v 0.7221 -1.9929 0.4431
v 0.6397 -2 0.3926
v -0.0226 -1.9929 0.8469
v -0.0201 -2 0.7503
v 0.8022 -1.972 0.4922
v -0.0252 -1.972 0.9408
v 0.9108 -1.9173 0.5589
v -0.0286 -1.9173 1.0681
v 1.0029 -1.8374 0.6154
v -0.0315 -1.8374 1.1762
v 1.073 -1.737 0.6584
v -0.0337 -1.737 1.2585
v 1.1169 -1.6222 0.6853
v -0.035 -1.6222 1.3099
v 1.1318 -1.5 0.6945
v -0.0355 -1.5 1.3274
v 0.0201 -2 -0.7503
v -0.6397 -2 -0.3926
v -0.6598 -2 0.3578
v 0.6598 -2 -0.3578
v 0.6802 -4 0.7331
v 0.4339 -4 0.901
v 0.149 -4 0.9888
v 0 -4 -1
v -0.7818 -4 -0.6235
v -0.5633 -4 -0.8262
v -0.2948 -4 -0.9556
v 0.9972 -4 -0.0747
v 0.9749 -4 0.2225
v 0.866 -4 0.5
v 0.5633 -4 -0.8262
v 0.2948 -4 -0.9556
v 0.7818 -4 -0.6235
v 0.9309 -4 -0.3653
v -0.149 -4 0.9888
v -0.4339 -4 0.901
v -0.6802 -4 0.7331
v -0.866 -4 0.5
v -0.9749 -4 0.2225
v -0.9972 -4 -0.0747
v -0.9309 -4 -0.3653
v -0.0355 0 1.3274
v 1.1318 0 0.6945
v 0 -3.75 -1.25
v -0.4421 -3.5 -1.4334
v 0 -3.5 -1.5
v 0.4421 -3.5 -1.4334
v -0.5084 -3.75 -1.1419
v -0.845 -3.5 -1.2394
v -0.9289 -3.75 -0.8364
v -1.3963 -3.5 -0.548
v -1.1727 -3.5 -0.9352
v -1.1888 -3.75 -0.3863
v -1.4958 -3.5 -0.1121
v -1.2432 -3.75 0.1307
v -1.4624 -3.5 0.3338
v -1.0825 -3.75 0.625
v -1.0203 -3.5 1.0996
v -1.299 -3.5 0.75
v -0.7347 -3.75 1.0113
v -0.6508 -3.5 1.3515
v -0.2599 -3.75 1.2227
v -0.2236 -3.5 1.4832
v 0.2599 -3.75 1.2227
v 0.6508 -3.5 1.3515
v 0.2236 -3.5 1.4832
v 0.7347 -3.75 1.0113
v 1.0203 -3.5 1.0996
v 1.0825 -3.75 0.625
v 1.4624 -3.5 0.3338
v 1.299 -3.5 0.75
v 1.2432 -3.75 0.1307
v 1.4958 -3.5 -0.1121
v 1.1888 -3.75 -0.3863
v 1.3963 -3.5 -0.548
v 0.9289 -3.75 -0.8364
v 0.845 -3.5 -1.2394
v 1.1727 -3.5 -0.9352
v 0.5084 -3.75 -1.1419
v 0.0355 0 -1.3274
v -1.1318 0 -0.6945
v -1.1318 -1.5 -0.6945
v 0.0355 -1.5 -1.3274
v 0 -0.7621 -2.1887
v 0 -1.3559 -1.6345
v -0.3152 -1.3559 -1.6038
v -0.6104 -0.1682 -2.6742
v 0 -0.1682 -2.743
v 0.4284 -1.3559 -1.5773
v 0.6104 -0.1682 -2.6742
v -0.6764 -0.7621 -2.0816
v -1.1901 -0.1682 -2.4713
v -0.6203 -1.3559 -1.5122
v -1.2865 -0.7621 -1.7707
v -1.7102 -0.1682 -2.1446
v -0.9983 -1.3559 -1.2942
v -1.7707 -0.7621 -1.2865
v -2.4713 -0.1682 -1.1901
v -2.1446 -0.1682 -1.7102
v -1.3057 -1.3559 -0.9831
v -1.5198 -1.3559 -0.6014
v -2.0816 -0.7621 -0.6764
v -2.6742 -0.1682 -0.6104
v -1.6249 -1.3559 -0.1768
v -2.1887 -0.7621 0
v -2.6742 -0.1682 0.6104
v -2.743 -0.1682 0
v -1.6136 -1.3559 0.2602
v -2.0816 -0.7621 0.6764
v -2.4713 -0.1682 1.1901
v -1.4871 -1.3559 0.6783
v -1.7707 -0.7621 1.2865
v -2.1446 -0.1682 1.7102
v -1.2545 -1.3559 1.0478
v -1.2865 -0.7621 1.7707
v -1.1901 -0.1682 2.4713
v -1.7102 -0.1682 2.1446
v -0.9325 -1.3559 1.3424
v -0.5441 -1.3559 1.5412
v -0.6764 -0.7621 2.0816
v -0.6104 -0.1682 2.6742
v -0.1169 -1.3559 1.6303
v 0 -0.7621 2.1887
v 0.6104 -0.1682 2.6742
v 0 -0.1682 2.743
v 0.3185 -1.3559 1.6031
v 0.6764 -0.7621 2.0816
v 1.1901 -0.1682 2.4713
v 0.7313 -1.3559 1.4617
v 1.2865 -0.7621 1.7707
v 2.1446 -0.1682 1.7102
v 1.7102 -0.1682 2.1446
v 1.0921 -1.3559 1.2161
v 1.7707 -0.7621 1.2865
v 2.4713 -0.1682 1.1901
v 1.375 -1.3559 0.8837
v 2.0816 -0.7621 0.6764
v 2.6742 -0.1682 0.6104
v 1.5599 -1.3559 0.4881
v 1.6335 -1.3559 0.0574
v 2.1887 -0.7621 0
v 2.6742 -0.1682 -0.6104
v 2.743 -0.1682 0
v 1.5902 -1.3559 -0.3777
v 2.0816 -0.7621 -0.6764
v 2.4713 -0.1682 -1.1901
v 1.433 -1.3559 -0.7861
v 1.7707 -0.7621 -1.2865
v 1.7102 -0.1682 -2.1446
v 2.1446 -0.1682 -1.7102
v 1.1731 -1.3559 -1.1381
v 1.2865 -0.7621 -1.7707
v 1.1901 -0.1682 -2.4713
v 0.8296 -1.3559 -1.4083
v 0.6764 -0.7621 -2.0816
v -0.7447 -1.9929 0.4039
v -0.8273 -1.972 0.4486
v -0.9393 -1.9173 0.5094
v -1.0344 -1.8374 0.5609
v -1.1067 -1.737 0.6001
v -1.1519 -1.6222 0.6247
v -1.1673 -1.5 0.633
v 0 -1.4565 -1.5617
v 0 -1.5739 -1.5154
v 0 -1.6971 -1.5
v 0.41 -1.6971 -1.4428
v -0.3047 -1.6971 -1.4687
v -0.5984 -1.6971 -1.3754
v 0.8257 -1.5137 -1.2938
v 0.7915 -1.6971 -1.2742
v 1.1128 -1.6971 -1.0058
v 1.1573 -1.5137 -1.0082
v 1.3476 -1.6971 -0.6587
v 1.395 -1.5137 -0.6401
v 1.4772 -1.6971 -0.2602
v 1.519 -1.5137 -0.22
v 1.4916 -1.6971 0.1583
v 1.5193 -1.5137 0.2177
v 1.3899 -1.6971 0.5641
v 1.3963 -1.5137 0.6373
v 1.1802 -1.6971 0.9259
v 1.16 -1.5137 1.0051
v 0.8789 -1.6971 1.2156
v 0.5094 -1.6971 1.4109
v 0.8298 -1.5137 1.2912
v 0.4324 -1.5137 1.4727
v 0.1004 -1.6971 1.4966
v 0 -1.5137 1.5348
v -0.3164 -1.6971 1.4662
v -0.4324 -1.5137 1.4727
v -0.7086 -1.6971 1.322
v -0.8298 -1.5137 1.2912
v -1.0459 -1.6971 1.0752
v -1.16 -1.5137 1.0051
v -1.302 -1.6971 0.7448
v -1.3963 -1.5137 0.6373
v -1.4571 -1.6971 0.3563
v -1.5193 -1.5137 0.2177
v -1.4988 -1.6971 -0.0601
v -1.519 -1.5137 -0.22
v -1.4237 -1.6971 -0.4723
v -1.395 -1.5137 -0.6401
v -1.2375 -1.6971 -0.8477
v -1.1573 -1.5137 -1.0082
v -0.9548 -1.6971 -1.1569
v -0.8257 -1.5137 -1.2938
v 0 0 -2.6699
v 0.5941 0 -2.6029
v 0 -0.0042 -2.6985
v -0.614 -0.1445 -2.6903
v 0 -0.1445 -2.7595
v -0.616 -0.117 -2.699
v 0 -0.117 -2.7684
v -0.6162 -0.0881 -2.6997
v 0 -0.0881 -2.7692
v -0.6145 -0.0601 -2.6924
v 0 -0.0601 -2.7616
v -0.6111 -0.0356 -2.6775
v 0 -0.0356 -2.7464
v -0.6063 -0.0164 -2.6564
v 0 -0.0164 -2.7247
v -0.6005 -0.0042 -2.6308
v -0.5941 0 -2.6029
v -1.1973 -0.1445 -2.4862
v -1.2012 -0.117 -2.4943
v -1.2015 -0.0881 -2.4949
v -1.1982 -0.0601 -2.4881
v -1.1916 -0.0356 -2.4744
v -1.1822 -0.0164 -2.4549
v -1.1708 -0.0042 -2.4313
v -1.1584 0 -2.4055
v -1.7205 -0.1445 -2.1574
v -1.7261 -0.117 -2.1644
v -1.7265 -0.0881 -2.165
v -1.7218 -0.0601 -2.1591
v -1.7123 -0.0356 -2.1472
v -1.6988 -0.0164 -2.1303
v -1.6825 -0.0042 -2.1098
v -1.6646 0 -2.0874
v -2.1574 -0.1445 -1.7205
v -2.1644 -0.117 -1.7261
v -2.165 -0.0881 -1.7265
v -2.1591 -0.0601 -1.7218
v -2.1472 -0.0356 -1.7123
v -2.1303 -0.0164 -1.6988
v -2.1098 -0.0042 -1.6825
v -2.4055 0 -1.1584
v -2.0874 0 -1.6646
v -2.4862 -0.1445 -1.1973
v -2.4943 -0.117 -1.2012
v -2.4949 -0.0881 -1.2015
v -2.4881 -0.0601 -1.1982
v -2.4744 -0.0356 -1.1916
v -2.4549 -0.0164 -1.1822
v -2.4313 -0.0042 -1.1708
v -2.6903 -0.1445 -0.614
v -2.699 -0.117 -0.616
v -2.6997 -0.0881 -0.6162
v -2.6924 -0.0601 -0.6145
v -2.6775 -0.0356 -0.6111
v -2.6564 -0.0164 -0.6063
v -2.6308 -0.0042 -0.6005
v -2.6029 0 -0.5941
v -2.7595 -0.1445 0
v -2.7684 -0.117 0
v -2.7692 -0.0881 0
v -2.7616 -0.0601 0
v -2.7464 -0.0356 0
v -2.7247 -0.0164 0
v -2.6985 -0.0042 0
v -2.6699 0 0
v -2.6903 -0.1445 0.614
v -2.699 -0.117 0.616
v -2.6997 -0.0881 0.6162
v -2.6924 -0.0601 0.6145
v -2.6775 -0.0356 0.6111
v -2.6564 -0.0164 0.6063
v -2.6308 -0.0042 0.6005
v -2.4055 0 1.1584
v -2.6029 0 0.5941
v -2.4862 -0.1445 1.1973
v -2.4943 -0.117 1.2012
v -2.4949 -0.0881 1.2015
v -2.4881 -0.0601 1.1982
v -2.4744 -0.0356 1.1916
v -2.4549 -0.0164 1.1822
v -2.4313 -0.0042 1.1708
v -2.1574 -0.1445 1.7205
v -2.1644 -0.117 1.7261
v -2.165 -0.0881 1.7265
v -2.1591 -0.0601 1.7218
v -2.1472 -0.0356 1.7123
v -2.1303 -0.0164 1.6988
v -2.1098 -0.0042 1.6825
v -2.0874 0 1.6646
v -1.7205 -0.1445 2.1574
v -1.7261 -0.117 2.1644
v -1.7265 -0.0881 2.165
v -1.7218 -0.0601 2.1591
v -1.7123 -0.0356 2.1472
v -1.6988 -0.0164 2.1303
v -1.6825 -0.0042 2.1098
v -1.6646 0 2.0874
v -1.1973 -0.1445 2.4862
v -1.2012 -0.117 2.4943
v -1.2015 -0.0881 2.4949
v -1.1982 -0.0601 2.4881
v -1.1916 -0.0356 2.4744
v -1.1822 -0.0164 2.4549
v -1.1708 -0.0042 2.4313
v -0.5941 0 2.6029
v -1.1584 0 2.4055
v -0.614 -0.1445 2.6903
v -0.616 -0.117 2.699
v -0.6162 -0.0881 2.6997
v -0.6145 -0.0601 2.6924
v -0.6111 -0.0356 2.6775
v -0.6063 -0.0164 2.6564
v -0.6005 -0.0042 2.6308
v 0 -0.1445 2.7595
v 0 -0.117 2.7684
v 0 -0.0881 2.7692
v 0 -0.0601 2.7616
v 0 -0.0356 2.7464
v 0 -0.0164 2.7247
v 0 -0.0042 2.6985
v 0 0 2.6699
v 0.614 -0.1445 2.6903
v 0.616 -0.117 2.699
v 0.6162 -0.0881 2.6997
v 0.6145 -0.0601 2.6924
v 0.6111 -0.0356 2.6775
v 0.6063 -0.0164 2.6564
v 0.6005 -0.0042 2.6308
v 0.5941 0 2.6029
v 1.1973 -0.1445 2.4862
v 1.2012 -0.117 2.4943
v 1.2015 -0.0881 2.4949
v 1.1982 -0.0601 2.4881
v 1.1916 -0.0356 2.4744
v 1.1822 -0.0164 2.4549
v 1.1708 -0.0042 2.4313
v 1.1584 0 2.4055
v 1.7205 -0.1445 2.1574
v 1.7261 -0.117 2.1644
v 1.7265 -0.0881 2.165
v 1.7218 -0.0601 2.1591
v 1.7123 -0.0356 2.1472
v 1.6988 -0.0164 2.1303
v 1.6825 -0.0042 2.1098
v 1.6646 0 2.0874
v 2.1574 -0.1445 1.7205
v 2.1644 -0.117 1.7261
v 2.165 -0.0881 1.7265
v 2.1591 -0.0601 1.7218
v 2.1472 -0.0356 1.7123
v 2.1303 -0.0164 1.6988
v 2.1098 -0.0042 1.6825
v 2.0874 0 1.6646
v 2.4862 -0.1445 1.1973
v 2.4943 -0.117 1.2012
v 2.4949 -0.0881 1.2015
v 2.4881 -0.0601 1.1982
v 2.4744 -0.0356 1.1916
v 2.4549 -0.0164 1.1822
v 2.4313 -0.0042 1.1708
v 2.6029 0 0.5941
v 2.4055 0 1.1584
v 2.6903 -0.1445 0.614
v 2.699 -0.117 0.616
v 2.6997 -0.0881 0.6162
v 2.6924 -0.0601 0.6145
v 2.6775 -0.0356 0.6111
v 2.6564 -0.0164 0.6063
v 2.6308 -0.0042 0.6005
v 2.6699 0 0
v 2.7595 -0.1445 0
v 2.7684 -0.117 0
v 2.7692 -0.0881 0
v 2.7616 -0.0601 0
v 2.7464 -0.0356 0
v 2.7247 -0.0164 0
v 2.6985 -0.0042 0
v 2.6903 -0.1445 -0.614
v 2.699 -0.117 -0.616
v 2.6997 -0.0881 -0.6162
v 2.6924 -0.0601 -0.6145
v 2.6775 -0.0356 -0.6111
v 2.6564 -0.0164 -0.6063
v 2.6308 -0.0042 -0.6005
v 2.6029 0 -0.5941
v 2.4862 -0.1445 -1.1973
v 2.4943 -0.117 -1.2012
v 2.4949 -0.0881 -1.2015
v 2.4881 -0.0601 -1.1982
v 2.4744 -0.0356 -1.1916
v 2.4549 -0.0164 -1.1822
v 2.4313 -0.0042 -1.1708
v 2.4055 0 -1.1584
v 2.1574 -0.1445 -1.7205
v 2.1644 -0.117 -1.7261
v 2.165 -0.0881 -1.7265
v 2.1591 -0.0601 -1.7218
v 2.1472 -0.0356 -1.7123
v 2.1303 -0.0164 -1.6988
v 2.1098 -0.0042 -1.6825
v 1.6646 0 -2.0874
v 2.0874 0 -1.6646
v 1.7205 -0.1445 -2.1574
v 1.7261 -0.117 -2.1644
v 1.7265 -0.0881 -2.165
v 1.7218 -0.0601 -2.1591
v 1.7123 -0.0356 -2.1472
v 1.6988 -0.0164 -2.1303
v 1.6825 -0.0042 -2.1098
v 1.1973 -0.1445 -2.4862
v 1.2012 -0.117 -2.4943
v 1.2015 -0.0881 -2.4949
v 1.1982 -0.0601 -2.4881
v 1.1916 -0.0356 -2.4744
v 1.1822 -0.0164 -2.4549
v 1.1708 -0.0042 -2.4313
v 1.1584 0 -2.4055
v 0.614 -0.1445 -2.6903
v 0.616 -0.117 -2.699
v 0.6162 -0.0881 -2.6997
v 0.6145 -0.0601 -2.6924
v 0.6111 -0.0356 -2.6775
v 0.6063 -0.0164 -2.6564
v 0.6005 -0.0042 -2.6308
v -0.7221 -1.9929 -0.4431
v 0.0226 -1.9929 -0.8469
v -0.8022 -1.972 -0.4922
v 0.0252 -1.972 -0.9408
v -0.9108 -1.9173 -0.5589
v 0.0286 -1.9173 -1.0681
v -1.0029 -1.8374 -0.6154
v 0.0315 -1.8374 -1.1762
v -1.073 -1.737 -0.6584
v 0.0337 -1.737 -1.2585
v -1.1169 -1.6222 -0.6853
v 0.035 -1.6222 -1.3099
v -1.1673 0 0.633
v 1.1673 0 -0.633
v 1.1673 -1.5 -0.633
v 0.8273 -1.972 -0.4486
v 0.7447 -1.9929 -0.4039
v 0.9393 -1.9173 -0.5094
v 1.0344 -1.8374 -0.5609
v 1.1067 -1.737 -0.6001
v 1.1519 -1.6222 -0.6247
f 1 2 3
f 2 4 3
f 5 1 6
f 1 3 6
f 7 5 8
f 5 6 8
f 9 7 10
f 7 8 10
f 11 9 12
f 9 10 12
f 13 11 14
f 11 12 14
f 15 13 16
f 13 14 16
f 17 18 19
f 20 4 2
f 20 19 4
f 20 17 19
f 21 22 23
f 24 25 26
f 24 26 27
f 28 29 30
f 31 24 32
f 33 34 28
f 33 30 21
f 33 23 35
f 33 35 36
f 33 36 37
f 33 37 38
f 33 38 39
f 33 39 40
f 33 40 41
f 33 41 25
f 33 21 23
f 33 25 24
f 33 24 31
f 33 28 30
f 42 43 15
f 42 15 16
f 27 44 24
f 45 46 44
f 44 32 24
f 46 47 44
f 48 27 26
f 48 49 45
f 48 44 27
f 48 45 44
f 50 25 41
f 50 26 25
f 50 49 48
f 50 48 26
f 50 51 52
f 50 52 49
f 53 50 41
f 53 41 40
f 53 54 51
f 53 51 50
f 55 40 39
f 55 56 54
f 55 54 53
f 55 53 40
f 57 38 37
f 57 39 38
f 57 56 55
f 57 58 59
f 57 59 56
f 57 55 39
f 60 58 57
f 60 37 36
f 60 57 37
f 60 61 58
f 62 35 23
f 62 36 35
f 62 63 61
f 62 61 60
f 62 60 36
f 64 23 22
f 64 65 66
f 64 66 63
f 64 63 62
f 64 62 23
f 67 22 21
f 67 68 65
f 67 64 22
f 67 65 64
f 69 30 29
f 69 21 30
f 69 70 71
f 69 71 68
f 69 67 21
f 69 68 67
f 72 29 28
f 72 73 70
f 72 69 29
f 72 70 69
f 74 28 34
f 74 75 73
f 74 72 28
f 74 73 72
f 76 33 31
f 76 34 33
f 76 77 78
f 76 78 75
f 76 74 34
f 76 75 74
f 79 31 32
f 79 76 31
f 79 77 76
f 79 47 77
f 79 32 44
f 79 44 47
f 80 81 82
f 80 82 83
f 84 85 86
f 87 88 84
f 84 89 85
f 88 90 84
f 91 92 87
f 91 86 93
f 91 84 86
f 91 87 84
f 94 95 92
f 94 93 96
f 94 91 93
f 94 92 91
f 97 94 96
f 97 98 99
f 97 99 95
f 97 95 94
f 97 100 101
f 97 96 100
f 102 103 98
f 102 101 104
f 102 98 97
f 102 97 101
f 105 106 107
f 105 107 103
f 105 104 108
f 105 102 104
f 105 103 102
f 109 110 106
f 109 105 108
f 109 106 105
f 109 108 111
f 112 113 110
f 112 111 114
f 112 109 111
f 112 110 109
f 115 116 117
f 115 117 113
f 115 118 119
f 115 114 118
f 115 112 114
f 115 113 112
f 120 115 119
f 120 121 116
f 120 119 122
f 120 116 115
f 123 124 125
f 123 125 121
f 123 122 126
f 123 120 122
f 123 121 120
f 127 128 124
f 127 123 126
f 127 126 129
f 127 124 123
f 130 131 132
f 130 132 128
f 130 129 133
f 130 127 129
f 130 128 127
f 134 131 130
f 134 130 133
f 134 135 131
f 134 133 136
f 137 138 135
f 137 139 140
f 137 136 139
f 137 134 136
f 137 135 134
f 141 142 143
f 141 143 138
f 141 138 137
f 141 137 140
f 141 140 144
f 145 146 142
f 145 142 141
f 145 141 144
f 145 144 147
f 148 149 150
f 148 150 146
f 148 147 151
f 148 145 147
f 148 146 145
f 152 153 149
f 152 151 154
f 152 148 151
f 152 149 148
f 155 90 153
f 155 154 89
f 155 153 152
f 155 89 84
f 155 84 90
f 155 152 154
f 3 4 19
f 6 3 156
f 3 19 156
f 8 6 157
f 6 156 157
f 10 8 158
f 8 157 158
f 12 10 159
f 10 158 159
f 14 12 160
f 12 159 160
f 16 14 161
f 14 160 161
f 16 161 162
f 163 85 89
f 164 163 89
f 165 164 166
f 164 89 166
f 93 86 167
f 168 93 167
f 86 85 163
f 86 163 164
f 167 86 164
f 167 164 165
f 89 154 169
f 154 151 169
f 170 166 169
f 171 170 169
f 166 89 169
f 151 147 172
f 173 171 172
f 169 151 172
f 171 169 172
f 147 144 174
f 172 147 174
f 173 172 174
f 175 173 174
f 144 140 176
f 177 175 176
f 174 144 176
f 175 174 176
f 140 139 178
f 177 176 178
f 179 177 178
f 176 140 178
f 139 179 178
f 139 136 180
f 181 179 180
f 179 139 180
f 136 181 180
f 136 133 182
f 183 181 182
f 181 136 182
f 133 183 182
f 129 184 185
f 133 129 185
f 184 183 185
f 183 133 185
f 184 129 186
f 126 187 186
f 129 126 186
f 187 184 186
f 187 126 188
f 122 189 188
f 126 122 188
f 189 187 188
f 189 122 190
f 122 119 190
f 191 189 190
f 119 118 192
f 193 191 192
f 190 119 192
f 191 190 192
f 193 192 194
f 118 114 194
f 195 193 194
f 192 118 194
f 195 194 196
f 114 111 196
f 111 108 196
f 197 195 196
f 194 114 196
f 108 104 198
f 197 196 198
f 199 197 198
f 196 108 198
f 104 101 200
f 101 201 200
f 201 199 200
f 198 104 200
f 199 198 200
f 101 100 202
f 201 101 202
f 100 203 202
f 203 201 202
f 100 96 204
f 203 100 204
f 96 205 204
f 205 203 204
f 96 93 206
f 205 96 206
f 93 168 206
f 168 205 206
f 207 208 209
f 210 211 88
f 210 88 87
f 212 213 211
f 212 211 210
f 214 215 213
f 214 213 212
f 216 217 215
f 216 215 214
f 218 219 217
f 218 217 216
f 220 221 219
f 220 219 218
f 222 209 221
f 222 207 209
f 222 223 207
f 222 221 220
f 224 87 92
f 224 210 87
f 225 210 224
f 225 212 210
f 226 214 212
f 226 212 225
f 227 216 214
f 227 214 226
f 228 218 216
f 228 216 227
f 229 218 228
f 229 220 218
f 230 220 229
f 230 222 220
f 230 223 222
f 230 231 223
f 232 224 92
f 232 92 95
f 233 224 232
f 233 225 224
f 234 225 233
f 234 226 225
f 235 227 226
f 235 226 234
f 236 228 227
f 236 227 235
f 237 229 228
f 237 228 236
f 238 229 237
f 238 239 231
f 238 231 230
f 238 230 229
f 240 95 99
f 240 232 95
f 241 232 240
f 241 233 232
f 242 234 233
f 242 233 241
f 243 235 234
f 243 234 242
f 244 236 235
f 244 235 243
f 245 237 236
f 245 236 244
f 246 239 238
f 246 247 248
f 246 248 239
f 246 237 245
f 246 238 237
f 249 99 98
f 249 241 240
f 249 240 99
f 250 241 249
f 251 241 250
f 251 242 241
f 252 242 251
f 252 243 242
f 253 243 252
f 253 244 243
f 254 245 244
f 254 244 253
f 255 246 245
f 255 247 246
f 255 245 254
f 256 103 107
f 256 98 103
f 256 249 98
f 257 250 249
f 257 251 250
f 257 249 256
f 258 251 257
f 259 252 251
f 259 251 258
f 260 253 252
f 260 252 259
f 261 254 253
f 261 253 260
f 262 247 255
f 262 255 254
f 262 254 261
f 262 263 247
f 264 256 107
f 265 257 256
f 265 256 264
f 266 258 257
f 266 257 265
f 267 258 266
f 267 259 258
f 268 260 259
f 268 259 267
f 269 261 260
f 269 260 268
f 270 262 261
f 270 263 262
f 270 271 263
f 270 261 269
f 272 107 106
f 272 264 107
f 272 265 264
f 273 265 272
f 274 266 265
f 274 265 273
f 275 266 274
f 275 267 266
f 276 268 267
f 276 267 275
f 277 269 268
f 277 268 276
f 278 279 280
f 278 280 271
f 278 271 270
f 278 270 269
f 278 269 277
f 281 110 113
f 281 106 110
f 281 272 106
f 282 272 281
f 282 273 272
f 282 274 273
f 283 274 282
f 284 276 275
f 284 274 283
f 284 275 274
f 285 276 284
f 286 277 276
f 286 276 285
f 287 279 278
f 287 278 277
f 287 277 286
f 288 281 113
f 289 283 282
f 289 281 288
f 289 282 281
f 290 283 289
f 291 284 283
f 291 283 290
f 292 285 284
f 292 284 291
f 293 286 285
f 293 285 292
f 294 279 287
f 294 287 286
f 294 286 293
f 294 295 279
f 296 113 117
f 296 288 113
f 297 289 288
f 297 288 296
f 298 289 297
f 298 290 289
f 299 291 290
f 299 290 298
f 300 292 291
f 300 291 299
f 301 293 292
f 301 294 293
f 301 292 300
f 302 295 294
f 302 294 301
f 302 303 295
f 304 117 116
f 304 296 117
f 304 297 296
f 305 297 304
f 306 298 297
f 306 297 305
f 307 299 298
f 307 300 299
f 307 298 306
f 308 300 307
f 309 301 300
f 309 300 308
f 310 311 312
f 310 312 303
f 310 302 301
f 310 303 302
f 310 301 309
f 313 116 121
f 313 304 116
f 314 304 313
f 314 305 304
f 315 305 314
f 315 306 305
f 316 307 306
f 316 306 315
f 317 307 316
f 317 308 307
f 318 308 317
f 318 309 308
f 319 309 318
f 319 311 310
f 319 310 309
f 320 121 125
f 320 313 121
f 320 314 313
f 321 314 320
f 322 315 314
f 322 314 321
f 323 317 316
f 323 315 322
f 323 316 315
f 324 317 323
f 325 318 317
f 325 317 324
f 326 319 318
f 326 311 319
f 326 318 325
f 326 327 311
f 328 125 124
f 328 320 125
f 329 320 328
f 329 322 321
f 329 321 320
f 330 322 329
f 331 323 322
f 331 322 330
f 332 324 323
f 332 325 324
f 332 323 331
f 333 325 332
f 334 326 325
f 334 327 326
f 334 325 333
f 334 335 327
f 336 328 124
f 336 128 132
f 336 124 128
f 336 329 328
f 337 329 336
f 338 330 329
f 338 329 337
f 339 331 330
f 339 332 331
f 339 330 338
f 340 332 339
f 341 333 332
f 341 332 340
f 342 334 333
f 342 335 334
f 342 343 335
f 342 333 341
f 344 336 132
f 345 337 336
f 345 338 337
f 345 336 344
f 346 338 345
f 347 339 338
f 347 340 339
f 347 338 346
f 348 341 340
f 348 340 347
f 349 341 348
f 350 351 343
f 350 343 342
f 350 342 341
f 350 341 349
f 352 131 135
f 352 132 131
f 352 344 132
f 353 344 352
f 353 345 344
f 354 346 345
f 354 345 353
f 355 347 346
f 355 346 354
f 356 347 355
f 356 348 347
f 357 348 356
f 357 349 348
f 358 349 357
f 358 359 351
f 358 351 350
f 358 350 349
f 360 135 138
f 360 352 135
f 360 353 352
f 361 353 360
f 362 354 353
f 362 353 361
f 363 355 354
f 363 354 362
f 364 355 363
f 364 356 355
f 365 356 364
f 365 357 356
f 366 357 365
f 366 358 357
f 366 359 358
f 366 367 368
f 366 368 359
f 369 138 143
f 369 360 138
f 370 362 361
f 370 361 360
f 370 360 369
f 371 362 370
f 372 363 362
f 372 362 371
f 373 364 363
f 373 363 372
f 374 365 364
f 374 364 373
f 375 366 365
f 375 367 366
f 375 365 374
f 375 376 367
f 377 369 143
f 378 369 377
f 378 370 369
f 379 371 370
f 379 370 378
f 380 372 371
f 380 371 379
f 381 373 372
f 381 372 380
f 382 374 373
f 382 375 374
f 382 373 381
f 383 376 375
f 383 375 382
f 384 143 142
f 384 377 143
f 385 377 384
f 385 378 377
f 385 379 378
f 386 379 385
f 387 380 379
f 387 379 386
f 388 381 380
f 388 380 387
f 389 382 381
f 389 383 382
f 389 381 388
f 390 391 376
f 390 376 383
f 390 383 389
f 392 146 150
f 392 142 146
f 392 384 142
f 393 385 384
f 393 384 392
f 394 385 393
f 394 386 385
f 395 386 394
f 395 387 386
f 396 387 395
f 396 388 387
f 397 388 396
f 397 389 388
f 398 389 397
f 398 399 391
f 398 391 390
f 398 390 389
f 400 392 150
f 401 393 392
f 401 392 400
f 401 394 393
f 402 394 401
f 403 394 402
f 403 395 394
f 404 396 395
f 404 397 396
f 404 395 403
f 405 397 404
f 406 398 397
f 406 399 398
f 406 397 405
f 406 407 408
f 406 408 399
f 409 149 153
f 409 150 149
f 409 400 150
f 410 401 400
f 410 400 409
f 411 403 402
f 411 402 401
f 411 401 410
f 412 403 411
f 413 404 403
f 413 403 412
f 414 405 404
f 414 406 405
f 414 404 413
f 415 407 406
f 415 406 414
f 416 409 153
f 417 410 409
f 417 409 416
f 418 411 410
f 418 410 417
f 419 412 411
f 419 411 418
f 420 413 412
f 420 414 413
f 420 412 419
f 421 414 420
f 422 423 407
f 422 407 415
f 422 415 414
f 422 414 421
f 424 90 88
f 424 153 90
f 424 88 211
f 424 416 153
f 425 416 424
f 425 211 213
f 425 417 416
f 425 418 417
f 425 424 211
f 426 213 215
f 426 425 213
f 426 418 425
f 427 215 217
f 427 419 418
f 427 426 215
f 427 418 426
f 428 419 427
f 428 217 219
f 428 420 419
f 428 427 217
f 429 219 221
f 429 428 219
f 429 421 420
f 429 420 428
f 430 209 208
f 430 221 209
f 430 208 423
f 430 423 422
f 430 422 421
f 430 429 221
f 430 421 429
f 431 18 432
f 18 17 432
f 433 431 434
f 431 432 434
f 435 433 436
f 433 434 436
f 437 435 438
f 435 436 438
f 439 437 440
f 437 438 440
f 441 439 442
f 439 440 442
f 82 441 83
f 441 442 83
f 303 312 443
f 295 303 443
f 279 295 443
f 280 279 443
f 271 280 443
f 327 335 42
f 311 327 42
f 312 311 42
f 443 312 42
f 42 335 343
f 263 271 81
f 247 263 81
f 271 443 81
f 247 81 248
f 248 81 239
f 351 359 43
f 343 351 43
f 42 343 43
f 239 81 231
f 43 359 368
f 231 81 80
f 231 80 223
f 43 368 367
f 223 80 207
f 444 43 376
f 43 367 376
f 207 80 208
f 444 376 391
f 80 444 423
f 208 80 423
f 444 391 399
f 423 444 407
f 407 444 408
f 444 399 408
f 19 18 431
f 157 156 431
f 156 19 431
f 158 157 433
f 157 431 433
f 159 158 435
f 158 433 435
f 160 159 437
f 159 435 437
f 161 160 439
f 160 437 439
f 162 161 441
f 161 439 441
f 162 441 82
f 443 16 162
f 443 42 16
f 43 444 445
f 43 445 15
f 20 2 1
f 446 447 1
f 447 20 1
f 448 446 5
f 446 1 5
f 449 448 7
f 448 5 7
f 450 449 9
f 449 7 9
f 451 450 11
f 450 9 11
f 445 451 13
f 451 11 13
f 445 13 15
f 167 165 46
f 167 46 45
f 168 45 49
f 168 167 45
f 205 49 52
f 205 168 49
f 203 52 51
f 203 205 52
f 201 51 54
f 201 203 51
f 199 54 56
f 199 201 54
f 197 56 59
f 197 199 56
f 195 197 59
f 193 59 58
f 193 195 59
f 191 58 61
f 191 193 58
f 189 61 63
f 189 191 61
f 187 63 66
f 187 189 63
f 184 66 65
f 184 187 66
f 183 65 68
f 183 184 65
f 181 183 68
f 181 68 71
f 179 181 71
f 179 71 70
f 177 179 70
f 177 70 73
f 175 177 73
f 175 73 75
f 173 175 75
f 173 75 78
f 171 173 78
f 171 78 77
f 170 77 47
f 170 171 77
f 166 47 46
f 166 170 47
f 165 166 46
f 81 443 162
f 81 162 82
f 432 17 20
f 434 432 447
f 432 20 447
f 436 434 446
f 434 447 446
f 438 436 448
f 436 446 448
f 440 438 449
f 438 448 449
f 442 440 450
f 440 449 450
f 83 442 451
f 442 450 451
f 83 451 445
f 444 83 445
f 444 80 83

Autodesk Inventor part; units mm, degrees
ref_plane "YZ Plane" through (0, 0, 0) normal (1, 0, 0) x (0, 1, 0)
ref_plane "XZ Plane" through (0, 0, 0) normal (0, 1, 0) x (-1, 0, 0)
ref_plane "XY Plane" through (0, 0, 0) normal (0, 0, 1) x (1, 0, 0)
sketch "Szkic2" plane through (0, 0, 0) normal (1, 0, 0) x (0, 1, 0)
  line L0 (0, -2.9) -> (0, 2.9)
  line L1 (-1.5, -1.5) -> (-1.5, 1.5)
  line L2 (-1.5, -1.5) -> (0, -2.9)
  line L3 (-1.5, 1.5) -> (0, 2.9)
  line L4 (0, 0) -> (-4, 0)
  line L5 (-4, 0) -> (-4, -1.5)
  line L6 (-4, -1.5) -> (-1.5, -1.5)
  dimension "d0" = 5.8
  dimension "d2" = 3
  dimension "d3" = 1.5
  dimension "d4" = 4
  dimension "d5" = 1.5
revolve "Obrót1" add sketch "Szkic2" angle 360 about axis through (0, 0, 0) along (0, -1, 0) contours L2 L1 L4 L0 | L6 L5 L4 L1
sketch "Szkic3" plane through (0, 0, 0) normal (0, 1, 0) x (1, 0, 0)
  line L0 (-1.1673, -0.633) -> (-1.1318, 0.6945)
  line L1 (-1.1318, 0.6945) -> (0.0355, 1.3274)
  line L2 (0.0355, 1.3274) -> (1.1673, 0.633)
  line L3 (1.1673, 0.633) -> (1.1318, -0.6945)
  line L4 (1.1318, -0.6945) -> (-0.0355, -1.3274)
  line L5 (-0.0355, -1.3274) -> (-1.1673, -0.633)
  point P0 (0, 0)
  point P1 (0, 0)
  dimension "d7" = 2.3
extrude "Wyciągnięcie proste1" cut sketch "Szkic3" against normal blind 2
fillet "Zaokrąglenie1" radius 0.5 6 edges at (-1.1496, -2, -0.0308) (-0.6014, -2, 0.9802) (-0.5482, -2, -1.011) (0.6014, -2, -0.9802) (0.5482, -2, 1.011) (1.1496, -2, 0.0308)
fillet "Zaokrąglenie2" radius 0.5 1 edges at (0, -1.5, 1.5)
fillet "Zaokrąglenie3" radius 0.1 1 edges at (0, 0, 2.9)
thread "Gwint1" size "M3x0.5" class "6g" standard "ANSI Metric M Profile" full length
chamfer "Faza1" distance 0.5 angle 45 1 edges at (0, -4, 1.5)
properties part number "Screw M3 4mm flat head"
